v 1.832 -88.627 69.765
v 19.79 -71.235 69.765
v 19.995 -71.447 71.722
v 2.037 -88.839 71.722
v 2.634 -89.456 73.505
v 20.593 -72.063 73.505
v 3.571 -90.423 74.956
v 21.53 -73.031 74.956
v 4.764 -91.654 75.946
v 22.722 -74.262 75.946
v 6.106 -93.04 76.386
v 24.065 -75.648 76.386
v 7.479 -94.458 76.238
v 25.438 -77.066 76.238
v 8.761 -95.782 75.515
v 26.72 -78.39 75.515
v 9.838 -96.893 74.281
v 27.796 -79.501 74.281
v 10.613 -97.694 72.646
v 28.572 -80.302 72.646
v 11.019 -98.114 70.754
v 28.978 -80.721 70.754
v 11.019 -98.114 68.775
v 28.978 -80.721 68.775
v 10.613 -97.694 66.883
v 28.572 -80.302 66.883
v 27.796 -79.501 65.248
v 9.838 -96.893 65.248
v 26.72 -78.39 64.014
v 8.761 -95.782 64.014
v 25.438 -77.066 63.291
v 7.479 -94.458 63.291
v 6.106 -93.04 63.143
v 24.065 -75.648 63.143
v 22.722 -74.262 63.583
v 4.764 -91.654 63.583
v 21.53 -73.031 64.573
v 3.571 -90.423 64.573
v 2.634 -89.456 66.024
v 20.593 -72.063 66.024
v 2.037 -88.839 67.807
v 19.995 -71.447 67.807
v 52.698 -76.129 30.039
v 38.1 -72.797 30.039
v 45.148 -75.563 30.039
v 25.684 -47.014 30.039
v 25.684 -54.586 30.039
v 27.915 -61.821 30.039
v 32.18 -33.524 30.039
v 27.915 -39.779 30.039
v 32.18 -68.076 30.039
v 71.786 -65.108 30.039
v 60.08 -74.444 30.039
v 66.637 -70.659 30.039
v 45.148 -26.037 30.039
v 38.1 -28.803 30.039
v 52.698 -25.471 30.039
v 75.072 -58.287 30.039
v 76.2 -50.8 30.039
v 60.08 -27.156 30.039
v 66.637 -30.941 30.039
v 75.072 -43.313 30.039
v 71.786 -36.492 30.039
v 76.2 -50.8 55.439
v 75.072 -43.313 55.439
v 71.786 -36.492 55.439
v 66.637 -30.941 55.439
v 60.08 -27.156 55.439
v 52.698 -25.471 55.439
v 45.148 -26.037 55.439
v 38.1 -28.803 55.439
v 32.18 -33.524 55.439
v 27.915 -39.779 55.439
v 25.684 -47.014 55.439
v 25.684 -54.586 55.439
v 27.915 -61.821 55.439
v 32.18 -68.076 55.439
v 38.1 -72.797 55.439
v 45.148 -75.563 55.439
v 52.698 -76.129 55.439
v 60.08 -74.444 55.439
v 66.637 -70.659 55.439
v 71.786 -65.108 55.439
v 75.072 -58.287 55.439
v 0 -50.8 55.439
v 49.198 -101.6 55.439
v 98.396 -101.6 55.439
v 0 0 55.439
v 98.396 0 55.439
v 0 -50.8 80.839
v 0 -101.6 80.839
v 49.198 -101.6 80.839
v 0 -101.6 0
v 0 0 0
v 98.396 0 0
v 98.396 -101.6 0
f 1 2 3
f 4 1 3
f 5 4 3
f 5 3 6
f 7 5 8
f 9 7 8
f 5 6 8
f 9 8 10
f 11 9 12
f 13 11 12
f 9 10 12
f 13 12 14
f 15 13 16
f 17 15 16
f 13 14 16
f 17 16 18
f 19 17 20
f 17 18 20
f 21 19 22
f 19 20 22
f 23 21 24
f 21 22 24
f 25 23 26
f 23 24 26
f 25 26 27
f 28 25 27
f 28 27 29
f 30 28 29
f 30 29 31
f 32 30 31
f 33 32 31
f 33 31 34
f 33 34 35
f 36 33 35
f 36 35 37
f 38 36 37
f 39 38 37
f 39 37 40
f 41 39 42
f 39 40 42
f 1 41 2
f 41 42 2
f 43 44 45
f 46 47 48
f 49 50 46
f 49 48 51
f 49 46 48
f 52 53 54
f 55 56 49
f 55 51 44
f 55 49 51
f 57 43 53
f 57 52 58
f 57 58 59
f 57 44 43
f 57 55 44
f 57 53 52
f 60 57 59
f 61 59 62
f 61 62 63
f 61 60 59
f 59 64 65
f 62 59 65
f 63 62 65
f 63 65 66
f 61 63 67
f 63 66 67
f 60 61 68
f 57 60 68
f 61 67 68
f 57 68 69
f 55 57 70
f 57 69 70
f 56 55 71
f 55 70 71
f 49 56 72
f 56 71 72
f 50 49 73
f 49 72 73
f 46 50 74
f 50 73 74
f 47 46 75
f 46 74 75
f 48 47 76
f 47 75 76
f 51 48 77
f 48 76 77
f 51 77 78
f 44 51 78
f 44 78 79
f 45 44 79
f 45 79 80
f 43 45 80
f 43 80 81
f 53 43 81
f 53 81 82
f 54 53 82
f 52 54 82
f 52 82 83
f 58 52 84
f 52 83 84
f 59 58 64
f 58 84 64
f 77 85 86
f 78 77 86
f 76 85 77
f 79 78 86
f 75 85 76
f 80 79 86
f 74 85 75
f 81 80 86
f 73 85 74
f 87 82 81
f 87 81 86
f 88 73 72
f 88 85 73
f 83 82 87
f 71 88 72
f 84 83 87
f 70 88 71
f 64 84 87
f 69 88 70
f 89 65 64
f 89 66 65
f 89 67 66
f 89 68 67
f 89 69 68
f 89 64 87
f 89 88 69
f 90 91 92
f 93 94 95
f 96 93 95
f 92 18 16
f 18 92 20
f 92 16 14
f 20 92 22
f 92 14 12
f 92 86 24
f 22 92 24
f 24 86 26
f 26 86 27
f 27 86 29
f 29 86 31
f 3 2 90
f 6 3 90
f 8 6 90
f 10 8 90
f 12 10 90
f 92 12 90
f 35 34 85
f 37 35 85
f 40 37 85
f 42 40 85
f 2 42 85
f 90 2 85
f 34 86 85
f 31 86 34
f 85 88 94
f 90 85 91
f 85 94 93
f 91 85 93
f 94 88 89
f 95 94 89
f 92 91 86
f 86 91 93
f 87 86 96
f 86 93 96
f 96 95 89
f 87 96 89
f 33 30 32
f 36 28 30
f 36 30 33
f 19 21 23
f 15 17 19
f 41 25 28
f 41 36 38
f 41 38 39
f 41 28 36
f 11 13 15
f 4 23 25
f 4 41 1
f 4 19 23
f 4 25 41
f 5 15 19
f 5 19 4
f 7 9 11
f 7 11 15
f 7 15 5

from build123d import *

# Parameters (mm, degrees)
F0_W     = 98.3961671591
F0_H     = 55.4385446012
F1_DEPTH = 101.6
F2_R     = 25.4
F3_DEPTH = 25.4
F5_DEPTH = 25.399999693
F6_R     = 6.6402223844
F7_DEPTH = 25


with BuildPart() as f1:
    # F0 (on Front) → F1 (new body)
    with BuildSketch(Plane.XZ):
        with Locations((49.1980835795, 27.7192723006)):
            Rectangle(F0_W, F0_H)
    extrude(amount=F1_DEPTH)

    # F2 (on face) → F3 (cut)
    with BuildSketch(Plane.XY.offset(55.4385446012)):
        with Locations((50.8, -50.8)):
            Circle(F2_R)
    extrude(amount=-F3_DEPTH, mode=Mode.SUBTRACT)

    # F4 (on face) → F5 (join)
    with BuildSketch(Plane.XY.offset(55.4385446012)):
        Polygon((49.1980835795, -101.6), (0, -50.8), (0, -101.6), align=None)
    extrude(amount=F5_DEPTH)

    # F6 (on face) → F7 (cut)
    with BuildSketch(Plane(origin=(-25.386966873, -24.5864196466, 0), x_dir=(-0.695690045, 0.7183420921, 0), z_dir=(0.7183420921, 0.695690045, 0))):
        with Locations((-71.5789571404, 69.76454705)):
            Circle(F6_R)
    extrude(amount=-F7_DEPTH, mode=Mode.SUBTRACT)


solid = f1.part
